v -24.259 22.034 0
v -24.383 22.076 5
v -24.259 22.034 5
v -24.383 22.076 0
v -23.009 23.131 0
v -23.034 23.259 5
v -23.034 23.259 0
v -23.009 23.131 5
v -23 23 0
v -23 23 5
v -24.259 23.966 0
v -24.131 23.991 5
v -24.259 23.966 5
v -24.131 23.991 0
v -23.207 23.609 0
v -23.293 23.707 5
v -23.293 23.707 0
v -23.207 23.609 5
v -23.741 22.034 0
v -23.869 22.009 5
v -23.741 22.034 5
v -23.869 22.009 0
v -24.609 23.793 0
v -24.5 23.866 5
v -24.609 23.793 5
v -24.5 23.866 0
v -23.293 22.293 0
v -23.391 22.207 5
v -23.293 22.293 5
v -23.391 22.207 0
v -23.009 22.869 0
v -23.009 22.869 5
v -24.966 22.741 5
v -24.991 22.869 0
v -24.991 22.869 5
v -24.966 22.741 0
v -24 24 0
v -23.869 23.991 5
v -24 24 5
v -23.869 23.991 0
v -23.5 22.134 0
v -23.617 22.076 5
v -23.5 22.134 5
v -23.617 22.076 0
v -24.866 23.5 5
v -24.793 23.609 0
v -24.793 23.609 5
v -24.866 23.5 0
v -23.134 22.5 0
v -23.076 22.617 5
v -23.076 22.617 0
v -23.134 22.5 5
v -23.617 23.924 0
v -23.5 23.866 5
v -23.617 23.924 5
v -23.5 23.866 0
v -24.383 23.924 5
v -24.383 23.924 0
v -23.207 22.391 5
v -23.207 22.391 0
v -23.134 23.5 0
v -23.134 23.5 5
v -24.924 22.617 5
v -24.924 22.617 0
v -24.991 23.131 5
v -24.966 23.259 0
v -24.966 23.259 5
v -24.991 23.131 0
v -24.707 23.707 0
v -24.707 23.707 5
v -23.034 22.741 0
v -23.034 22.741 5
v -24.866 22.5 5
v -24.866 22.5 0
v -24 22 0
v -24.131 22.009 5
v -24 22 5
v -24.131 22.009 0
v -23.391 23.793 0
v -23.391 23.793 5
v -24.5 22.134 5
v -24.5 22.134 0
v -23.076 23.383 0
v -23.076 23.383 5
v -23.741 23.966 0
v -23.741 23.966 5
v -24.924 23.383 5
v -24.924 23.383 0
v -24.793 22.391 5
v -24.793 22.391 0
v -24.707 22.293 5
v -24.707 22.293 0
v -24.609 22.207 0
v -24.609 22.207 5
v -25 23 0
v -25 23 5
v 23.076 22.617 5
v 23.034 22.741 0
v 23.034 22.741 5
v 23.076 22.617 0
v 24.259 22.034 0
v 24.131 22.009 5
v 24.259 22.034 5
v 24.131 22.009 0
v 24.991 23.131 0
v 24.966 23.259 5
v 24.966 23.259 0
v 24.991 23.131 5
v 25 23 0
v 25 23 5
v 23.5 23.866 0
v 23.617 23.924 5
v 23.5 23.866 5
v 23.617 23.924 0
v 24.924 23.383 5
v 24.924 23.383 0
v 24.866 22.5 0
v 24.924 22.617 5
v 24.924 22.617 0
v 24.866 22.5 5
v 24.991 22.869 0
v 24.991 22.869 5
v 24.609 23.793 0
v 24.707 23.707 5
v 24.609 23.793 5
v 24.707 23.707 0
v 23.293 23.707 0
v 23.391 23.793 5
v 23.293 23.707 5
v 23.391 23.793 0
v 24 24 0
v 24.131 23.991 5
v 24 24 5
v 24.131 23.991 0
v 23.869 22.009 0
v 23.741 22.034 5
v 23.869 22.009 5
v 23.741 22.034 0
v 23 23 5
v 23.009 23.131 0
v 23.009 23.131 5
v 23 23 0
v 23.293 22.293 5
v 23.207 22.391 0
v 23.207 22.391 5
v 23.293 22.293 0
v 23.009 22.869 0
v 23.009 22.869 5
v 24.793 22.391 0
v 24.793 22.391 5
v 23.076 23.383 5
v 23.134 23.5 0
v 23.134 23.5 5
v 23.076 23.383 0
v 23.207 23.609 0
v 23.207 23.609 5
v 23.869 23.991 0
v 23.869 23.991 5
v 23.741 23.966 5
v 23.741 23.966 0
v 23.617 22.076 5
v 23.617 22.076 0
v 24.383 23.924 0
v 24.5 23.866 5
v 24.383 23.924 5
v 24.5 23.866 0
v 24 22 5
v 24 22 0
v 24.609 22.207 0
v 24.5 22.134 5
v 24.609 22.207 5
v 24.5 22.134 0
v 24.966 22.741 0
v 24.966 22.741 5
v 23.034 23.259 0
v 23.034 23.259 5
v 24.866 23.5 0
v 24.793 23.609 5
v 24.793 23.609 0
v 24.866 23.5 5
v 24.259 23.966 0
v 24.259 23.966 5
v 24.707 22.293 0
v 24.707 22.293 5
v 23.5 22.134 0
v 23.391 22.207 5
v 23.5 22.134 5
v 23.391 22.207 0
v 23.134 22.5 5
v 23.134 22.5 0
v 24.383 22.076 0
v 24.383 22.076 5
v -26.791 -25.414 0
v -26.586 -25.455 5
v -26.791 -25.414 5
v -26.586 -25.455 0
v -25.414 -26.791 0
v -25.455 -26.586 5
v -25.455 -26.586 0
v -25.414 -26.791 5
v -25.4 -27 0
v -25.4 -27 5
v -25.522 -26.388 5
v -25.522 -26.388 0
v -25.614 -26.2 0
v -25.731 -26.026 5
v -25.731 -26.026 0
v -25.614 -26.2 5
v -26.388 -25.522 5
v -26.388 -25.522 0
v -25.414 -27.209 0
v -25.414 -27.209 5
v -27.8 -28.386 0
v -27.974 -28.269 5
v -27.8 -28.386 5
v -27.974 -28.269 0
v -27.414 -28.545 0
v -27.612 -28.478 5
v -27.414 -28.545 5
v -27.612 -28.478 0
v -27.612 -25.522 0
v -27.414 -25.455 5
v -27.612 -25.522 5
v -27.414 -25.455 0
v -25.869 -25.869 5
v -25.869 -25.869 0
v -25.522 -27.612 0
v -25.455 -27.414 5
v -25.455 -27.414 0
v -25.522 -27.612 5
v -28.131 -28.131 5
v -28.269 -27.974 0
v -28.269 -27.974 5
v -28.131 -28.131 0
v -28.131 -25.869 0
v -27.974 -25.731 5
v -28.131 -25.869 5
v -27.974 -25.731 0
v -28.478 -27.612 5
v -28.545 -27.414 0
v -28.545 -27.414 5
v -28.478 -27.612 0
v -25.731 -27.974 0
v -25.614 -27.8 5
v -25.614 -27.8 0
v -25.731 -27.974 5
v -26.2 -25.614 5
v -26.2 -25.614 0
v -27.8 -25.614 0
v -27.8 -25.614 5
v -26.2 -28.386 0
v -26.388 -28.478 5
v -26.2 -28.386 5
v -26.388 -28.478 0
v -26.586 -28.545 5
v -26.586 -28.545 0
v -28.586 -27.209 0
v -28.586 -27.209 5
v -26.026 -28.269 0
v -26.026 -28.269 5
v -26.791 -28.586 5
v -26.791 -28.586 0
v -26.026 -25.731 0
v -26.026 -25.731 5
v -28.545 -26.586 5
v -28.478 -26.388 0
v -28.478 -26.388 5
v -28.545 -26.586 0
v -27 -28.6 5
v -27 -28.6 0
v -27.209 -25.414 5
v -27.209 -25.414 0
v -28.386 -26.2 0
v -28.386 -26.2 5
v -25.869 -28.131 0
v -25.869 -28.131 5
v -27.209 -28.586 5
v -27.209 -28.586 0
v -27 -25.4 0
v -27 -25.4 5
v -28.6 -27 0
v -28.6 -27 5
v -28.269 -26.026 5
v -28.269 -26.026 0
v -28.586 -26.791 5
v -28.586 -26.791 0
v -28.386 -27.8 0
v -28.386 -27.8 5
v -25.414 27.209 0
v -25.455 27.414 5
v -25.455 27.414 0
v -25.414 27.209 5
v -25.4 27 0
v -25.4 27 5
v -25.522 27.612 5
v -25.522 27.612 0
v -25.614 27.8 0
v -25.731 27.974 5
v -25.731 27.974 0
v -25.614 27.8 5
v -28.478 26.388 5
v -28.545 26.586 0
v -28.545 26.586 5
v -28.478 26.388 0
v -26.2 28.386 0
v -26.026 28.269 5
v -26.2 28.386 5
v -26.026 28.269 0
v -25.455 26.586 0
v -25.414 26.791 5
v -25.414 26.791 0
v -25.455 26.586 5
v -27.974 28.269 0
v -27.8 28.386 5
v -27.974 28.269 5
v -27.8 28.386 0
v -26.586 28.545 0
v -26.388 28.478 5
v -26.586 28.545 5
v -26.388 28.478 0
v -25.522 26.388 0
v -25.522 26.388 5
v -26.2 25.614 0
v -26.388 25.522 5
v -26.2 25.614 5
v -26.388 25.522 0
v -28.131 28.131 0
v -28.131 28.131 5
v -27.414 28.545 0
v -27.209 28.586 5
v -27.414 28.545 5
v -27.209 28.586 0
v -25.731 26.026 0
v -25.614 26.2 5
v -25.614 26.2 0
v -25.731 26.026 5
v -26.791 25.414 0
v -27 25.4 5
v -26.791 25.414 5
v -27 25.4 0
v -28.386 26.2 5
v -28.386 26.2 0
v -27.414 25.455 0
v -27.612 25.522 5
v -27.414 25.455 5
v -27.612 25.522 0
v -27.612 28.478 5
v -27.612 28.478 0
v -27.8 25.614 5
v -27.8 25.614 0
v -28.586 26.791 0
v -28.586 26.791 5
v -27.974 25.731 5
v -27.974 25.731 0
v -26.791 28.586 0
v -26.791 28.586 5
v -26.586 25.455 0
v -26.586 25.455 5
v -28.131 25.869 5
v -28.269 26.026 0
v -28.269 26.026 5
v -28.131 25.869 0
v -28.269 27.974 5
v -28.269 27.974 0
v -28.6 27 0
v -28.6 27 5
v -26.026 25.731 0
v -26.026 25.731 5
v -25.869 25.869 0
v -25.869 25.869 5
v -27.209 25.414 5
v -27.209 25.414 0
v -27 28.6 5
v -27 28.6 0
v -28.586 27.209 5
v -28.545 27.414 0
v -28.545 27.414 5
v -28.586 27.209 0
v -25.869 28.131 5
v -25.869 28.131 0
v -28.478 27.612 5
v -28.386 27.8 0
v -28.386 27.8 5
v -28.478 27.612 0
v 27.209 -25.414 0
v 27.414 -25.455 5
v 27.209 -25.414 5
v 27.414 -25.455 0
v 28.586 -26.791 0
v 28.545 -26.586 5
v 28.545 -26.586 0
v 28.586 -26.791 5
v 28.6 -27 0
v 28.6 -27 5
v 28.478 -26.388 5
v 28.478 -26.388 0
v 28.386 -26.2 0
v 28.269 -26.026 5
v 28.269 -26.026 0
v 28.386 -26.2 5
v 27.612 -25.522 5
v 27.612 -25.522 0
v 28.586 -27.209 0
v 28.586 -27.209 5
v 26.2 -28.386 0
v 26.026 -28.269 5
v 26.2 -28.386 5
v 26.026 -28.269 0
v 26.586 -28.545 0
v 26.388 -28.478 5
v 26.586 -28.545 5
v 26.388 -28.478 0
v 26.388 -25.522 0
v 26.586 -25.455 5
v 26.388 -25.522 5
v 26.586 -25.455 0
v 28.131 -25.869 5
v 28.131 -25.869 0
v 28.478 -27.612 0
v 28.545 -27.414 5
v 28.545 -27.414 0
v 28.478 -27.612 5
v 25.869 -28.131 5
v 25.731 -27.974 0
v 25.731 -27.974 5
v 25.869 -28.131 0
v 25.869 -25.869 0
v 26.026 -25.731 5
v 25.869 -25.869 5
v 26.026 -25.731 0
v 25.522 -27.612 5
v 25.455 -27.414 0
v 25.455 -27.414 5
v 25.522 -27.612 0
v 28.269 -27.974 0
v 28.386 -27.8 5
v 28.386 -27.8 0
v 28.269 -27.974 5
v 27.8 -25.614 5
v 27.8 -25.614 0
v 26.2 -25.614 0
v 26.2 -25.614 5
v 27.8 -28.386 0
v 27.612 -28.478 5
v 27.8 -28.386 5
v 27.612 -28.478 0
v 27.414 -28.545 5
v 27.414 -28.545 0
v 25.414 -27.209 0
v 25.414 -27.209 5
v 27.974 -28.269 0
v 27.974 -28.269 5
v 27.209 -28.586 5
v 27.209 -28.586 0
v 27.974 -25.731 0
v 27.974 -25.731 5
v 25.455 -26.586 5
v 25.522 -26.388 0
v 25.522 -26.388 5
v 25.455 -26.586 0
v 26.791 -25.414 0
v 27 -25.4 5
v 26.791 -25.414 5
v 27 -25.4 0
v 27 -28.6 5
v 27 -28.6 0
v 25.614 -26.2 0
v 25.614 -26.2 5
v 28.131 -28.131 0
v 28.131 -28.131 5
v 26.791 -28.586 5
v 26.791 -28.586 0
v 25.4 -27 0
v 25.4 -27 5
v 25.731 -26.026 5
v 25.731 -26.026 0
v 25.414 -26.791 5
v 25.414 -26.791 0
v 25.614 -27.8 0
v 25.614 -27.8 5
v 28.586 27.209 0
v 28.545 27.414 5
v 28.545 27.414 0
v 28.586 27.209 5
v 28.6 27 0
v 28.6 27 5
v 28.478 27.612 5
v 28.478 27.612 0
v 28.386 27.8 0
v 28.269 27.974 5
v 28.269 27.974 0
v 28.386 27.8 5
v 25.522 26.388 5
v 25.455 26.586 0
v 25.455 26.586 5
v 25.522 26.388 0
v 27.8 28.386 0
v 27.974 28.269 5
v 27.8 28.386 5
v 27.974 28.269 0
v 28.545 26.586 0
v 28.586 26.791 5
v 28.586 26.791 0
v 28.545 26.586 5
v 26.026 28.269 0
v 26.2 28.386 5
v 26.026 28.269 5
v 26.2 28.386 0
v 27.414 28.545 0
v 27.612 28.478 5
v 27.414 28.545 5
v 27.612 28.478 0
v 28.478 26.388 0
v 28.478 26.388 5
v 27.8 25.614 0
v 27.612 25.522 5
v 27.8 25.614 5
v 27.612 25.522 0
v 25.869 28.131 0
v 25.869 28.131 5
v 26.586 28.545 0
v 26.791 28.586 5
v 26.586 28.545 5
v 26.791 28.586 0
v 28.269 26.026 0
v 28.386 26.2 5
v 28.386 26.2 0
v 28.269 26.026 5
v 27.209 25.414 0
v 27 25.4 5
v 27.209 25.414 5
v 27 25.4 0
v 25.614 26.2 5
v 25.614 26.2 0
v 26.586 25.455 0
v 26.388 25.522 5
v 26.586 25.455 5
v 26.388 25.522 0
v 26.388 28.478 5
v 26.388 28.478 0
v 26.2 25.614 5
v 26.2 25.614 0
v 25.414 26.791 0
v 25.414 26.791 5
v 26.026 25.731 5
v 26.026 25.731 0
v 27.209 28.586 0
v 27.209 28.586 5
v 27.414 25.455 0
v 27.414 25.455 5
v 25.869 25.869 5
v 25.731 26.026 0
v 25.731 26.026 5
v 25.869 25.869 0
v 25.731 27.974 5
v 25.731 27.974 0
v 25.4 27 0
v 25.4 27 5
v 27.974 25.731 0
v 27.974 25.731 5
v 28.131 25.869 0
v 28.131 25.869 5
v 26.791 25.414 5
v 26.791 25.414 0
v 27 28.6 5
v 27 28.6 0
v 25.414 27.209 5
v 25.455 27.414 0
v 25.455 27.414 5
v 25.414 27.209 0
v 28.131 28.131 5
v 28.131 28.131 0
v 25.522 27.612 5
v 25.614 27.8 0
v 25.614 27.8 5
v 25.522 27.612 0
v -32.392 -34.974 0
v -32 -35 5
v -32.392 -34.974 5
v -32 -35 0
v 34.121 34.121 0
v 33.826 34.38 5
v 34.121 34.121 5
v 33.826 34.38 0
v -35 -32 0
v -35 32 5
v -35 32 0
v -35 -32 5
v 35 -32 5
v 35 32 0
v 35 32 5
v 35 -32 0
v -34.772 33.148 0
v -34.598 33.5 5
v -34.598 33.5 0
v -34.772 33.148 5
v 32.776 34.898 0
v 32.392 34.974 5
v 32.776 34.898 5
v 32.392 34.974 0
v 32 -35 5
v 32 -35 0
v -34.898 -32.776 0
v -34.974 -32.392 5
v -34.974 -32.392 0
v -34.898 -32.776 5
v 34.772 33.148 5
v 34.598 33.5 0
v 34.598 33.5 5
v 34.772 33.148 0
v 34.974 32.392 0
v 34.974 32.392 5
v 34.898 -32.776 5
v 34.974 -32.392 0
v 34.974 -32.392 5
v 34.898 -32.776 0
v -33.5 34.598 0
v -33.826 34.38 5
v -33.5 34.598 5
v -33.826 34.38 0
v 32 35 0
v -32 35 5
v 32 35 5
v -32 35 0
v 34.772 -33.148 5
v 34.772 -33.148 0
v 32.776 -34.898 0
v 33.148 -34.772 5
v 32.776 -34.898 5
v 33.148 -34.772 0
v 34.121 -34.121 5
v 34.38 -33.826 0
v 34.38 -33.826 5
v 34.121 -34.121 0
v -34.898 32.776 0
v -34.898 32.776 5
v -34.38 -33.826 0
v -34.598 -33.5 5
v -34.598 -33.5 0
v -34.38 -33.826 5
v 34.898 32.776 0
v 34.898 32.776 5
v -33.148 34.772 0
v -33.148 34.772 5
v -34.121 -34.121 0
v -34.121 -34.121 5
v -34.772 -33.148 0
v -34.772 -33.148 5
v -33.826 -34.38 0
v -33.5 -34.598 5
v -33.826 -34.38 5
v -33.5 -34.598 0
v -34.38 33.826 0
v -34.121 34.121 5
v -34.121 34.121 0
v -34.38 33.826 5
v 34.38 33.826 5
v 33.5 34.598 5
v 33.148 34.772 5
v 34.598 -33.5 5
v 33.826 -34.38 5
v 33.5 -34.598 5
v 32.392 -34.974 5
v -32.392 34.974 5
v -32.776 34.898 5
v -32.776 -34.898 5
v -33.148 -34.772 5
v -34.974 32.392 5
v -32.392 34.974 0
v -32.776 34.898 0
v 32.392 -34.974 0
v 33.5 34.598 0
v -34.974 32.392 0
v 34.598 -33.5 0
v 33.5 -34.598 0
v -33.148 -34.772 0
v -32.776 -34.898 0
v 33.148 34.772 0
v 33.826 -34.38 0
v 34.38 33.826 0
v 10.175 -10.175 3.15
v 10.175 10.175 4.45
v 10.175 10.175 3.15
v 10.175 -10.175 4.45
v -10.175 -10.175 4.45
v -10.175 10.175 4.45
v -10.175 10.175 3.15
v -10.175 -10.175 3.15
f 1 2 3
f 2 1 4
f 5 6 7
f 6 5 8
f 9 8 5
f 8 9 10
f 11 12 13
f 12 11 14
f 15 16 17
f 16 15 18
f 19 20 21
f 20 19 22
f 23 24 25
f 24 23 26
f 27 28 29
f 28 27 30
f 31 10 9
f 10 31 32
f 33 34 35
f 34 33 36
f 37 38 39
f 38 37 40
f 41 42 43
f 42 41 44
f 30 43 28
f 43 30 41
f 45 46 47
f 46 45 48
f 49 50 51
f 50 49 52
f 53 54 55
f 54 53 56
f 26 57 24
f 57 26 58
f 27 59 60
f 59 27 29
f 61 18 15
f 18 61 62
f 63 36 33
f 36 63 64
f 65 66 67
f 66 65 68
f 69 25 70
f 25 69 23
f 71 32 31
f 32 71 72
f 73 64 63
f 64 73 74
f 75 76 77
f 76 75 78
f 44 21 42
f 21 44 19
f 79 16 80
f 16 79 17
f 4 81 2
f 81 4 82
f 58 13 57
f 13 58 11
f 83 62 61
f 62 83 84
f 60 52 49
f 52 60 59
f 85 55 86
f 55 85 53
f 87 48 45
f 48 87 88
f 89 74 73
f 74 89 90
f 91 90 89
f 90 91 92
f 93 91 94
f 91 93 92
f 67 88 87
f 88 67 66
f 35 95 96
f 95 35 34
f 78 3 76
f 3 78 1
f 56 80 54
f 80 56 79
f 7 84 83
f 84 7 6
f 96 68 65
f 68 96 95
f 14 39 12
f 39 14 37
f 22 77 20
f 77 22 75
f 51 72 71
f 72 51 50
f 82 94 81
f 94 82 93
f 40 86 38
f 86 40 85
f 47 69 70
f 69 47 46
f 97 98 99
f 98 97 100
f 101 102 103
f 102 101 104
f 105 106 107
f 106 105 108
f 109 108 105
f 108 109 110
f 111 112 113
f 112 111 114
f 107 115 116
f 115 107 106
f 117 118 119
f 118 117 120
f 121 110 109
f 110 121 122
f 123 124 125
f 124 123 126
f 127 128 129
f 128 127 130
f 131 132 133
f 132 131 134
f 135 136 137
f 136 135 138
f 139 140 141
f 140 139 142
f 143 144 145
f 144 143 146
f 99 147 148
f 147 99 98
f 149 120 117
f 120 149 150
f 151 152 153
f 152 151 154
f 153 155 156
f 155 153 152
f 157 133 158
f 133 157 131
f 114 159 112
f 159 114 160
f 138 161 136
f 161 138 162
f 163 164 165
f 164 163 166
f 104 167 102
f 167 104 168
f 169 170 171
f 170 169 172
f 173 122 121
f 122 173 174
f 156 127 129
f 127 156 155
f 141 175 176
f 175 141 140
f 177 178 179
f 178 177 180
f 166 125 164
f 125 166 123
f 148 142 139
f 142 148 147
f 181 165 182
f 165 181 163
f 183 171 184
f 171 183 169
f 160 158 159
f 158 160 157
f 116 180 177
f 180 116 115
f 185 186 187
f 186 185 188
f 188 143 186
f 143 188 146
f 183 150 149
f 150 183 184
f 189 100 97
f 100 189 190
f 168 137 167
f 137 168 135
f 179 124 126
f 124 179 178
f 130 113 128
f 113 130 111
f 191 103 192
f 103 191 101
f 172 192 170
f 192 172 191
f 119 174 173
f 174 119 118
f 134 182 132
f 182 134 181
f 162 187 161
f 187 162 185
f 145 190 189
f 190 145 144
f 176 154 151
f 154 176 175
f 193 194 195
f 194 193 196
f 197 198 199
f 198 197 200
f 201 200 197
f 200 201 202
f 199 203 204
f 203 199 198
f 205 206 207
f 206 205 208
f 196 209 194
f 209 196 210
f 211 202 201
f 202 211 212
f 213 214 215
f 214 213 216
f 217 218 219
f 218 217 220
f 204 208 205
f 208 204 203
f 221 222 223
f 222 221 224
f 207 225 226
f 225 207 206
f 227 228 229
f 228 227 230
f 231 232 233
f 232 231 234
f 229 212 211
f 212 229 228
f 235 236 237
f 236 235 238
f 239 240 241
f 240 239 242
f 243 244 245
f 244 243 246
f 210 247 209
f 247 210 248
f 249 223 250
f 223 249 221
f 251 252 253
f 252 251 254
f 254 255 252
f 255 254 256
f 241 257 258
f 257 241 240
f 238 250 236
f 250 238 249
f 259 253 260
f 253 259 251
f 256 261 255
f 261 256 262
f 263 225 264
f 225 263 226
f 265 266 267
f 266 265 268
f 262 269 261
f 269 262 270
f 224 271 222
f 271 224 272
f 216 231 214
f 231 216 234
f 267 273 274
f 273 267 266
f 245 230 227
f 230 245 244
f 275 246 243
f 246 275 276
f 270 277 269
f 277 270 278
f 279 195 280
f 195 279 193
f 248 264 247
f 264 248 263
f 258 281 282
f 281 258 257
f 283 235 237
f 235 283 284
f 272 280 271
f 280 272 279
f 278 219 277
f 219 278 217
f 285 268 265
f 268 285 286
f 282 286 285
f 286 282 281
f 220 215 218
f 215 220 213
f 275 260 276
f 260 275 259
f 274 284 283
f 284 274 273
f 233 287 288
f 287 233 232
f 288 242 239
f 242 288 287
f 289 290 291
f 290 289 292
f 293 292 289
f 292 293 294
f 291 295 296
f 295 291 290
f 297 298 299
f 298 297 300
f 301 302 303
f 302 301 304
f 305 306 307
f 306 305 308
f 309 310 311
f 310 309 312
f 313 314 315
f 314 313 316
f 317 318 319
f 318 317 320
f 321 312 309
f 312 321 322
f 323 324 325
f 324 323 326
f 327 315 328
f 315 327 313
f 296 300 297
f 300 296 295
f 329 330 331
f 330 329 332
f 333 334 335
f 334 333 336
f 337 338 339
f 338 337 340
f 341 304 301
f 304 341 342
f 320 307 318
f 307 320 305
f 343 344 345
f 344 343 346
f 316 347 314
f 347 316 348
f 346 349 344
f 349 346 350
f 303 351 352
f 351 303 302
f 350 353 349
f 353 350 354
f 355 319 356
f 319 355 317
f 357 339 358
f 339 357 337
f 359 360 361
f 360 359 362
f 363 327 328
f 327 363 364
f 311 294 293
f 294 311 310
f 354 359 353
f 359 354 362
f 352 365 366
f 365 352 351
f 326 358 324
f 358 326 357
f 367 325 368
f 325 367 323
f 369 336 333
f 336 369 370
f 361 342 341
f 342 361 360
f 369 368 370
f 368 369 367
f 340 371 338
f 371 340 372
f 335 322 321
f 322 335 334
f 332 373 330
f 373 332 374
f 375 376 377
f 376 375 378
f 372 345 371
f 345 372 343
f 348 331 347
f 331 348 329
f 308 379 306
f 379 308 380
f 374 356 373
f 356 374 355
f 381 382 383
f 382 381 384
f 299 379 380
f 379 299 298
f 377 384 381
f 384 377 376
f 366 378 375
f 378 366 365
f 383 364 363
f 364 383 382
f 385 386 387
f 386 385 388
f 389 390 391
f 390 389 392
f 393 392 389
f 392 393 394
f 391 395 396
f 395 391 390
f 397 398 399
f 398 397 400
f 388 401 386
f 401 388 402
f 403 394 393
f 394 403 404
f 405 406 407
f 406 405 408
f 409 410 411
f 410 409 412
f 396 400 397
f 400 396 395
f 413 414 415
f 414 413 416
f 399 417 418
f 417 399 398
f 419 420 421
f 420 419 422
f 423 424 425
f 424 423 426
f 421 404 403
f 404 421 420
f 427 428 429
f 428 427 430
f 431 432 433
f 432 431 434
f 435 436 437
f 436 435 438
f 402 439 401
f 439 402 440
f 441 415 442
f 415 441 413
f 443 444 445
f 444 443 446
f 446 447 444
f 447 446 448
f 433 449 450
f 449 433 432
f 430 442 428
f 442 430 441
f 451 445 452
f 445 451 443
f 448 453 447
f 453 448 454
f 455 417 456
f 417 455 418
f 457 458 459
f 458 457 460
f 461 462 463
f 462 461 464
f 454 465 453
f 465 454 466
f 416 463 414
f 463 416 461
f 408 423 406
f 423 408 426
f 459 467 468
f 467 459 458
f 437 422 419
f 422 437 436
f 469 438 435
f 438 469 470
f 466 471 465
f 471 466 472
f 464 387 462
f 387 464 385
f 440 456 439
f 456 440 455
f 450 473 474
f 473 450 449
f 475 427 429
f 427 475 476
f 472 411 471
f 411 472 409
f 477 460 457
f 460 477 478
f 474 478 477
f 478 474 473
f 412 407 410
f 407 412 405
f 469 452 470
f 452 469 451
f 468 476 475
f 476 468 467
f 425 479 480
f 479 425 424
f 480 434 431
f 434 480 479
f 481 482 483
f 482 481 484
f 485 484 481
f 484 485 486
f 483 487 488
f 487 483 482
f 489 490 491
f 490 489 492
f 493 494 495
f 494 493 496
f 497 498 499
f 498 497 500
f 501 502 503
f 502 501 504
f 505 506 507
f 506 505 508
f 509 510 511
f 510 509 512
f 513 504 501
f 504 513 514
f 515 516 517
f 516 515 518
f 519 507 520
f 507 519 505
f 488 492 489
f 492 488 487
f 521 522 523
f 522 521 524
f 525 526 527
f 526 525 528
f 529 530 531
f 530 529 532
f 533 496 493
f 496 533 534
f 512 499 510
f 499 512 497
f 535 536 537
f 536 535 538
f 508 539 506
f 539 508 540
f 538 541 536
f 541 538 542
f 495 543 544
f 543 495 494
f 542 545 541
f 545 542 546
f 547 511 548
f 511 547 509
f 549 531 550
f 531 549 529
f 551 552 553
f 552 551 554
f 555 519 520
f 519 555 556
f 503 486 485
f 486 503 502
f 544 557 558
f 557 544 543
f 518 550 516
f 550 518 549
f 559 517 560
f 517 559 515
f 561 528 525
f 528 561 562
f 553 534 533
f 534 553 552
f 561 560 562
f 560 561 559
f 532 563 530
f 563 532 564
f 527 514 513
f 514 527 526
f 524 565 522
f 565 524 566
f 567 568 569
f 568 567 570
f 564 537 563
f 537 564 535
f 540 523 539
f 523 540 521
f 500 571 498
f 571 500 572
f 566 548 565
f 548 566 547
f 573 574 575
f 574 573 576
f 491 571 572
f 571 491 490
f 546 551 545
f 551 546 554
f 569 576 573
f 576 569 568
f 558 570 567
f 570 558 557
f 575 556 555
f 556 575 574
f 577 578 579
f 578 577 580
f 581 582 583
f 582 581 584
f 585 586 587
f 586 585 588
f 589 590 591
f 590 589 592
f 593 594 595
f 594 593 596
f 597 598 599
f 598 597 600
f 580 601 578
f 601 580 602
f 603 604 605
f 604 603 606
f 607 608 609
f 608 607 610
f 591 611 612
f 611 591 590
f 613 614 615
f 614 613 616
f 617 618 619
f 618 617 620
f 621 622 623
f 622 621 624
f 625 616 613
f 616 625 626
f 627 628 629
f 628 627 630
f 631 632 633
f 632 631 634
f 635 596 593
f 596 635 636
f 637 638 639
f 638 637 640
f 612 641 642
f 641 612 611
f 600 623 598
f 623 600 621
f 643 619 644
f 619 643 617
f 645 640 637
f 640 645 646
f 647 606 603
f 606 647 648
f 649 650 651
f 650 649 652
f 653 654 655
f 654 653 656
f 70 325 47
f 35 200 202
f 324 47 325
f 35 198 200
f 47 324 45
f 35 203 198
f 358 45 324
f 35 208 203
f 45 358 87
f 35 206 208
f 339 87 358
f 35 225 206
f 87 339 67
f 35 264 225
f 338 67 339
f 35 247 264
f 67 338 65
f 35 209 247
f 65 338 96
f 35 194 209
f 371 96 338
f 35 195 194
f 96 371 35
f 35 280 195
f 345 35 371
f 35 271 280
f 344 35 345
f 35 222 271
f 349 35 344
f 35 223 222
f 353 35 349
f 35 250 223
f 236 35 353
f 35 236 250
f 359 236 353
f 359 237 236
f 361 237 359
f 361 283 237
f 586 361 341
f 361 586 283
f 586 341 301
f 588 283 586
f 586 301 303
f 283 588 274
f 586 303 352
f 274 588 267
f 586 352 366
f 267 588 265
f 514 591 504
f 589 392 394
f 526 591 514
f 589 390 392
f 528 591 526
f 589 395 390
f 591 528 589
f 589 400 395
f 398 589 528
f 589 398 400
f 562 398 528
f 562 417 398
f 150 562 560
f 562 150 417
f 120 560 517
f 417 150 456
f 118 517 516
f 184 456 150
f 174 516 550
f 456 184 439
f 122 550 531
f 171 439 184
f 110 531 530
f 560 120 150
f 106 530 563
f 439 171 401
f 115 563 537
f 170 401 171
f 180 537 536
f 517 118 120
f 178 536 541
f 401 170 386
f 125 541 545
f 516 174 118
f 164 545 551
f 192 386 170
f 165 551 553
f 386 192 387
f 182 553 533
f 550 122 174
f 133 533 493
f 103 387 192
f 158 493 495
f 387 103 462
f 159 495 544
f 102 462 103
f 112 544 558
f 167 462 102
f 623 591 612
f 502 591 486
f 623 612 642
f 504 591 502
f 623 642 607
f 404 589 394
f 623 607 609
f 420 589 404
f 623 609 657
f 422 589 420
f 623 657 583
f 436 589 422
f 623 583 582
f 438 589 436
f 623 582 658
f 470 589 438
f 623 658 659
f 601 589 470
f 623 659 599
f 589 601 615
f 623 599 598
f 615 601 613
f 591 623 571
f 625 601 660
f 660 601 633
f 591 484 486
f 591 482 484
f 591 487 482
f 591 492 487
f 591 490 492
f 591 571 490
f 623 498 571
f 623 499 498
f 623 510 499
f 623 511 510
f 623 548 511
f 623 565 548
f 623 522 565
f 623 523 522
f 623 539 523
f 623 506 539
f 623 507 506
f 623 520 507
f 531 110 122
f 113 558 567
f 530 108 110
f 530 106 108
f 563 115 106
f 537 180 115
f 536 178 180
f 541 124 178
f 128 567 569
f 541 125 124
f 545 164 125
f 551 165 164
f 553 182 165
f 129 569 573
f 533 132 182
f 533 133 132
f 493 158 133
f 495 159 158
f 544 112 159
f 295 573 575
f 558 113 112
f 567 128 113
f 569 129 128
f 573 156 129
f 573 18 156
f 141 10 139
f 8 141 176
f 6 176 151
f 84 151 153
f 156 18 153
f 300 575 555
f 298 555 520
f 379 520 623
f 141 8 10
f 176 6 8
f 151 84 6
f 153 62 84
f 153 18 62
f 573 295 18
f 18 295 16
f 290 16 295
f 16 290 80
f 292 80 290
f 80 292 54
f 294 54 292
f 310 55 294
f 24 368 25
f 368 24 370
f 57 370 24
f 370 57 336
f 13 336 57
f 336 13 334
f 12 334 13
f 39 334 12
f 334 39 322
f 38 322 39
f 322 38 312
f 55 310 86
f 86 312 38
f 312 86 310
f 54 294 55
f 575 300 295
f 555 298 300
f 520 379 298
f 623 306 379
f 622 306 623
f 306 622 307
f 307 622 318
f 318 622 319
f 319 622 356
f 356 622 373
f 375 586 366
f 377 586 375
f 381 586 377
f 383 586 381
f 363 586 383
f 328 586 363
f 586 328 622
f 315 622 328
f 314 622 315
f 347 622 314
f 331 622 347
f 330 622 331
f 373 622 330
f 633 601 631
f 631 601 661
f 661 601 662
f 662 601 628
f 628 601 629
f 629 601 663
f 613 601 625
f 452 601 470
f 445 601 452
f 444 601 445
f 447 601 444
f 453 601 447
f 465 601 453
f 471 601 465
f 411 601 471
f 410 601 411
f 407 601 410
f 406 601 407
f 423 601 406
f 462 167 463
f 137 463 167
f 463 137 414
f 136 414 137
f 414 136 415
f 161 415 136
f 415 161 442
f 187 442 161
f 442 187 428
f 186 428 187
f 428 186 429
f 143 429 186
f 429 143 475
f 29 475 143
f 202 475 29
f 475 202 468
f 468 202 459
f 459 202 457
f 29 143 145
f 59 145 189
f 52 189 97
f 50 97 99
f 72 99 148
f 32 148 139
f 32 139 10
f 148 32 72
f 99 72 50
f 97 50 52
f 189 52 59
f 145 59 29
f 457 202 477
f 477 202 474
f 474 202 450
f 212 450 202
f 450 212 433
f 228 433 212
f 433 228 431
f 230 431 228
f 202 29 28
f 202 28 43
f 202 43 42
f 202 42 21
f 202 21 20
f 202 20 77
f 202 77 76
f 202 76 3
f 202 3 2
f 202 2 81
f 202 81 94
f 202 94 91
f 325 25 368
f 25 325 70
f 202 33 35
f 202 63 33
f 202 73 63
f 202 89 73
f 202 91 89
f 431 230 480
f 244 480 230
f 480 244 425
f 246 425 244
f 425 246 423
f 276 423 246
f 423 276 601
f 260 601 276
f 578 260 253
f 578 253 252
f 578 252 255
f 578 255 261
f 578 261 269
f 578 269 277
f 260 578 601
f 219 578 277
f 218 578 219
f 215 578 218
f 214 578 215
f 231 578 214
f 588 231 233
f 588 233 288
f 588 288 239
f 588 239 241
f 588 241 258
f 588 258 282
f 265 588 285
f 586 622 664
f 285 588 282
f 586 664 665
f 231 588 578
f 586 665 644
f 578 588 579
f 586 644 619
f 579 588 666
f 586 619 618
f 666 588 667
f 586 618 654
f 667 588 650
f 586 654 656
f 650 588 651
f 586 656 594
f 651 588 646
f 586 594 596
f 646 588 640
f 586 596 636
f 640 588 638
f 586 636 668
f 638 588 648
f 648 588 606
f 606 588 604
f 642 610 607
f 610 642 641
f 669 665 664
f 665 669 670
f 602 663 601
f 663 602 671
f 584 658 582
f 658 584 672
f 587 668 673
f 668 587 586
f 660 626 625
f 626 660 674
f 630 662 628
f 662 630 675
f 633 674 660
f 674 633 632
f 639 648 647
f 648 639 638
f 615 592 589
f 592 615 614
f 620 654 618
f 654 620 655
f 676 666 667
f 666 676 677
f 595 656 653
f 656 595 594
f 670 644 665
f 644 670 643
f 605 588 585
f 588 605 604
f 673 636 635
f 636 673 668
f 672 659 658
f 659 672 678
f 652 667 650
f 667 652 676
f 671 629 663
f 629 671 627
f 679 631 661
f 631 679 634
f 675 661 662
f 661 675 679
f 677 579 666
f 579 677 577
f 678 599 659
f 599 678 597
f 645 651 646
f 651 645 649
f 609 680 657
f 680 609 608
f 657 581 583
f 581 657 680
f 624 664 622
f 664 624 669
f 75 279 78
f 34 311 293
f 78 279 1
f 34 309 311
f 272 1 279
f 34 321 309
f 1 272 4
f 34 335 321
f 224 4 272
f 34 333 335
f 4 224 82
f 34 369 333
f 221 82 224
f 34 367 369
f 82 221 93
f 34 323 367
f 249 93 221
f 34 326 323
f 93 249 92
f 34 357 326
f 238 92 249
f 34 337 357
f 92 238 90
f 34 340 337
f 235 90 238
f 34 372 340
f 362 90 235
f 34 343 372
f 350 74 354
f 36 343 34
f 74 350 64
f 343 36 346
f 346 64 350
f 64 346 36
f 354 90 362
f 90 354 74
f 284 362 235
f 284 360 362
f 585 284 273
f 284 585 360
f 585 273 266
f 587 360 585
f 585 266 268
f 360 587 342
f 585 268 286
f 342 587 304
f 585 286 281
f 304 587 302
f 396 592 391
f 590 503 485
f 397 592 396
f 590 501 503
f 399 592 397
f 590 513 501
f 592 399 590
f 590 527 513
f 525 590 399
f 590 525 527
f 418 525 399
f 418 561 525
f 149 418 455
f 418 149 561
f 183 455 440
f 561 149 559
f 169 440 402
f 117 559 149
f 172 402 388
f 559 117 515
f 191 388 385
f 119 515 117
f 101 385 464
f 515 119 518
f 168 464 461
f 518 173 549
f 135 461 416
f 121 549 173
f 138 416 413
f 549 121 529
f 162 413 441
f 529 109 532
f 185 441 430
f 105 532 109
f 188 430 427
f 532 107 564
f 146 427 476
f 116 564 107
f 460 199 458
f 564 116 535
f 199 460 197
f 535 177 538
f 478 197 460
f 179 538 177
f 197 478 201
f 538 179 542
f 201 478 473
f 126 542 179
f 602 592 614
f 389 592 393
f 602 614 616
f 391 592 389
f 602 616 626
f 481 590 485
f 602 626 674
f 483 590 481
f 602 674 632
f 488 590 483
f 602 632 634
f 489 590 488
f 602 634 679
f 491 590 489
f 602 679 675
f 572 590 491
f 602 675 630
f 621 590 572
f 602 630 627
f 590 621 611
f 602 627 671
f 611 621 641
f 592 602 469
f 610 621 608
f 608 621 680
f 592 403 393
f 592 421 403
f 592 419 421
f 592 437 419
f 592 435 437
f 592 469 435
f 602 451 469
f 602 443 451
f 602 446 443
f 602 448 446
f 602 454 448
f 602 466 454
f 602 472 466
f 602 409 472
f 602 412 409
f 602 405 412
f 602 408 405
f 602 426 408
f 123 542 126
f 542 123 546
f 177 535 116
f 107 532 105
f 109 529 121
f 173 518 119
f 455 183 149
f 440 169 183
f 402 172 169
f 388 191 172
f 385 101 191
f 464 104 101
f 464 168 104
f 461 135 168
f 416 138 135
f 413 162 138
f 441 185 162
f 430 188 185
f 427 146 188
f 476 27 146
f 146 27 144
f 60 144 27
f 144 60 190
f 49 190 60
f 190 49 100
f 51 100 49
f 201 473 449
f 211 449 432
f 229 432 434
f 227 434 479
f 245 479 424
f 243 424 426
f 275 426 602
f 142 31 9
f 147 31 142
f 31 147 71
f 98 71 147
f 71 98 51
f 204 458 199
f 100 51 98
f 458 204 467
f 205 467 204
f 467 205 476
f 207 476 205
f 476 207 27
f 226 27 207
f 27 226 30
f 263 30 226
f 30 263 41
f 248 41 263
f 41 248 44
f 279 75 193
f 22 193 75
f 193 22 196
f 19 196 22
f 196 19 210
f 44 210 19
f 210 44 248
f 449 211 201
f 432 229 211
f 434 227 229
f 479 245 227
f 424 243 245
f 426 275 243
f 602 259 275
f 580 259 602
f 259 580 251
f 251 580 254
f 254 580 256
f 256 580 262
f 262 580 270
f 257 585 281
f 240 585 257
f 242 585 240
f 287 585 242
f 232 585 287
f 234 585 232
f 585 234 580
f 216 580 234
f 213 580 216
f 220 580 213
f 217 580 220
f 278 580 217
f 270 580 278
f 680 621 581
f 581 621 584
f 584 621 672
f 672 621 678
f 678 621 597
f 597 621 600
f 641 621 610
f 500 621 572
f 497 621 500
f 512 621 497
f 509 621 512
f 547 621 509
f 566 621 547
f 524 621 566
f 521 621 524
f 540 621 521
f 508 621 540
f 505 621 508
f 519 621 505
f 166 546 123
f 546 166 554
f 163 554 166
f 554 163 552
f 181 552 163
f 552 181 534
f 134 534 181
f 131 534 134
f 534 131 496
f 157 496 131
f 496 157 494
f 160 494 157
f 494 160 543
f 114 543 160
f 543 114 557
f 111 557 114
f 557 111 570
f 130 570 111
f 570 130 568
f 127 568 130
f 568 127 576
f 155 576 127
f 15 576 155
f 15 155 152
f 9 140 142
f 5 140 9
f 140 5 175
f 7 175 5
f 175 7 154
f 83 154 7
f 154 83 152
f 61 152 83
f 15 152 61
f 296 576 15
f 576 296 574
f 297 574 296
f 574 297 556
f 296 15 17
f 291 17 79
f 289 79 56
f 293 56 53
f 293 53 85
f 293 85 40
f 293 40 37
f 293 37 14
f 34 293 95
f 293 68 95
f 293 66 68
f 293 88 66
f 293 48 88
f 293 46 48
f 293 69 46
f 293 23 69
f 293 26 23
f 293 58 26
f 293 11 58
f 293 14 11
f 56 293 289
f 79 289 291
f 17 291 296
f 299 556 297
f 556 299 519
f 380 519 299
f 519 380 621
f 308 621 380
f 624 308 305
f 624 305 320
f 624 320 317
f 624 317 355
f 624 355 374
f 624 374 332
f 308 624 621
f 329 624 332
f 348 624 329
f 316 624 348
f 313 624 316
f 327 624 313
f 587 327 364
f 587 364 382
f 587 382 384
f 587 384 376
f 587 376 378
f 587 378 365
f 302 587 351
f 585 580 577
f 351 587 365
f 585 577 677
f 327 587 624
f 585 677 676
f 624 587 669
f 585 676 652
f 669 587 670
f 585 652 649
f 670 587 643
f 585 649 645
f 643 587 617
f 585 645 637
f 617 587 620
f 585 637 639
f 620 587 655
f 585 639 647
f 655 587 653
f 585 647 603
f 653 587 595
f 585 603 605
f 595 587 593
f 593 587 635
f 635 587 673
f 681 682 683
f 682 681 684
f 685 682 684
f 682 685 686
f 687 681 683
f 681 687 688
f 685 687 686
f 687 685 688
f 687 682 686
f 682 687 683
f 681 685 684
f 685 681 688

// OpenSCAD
// Original parametric fixture concept. For mechanical fit review only.
// The tray is NOT a UV enclosure, interlock, or certified chemical process tool.
chip_size = 20;          // verify actual substrate: 10-20 mm target range
chip_clearance = 0.35;
tray_width = 70;
tray_length = 70;
tray_thickness = 5;
pocket_depth = 1.2;
corner_radius = 3;
fiducial_diameter = 2;
$fn = 48;

module roundplate(w,l,h,r) {
  hull() for(x=[-w/2+r,w/2-r],y=[-l/2+r,l/2-r])
    translate([x,y,0]) cylinder(h=h,r=r);
}

difference() {
  roundplate(tray_width,tray_length,tray_thickness,corner_radius);
  translate([0,0,tray_thickness-pocket_depth])
    cube([chip_size+chip_clearance,chip_size+chip_clearance,pocket_depth+0.1],center=true);
  // Two fiducials visible to an overhead camera.
  for(x=[-24,24]) translate([x,23,-0.1])
    cylinder(h=tray_thickness+0.2,d=fiducial_diameter);
  // Fastener clearances for an external supervised fixture.
  for(x=[-27,27],y=[-27,27]) translate([x,y,-0.1])
    cylinder(h=tray_thickness+0.2,d=3.2);
}
